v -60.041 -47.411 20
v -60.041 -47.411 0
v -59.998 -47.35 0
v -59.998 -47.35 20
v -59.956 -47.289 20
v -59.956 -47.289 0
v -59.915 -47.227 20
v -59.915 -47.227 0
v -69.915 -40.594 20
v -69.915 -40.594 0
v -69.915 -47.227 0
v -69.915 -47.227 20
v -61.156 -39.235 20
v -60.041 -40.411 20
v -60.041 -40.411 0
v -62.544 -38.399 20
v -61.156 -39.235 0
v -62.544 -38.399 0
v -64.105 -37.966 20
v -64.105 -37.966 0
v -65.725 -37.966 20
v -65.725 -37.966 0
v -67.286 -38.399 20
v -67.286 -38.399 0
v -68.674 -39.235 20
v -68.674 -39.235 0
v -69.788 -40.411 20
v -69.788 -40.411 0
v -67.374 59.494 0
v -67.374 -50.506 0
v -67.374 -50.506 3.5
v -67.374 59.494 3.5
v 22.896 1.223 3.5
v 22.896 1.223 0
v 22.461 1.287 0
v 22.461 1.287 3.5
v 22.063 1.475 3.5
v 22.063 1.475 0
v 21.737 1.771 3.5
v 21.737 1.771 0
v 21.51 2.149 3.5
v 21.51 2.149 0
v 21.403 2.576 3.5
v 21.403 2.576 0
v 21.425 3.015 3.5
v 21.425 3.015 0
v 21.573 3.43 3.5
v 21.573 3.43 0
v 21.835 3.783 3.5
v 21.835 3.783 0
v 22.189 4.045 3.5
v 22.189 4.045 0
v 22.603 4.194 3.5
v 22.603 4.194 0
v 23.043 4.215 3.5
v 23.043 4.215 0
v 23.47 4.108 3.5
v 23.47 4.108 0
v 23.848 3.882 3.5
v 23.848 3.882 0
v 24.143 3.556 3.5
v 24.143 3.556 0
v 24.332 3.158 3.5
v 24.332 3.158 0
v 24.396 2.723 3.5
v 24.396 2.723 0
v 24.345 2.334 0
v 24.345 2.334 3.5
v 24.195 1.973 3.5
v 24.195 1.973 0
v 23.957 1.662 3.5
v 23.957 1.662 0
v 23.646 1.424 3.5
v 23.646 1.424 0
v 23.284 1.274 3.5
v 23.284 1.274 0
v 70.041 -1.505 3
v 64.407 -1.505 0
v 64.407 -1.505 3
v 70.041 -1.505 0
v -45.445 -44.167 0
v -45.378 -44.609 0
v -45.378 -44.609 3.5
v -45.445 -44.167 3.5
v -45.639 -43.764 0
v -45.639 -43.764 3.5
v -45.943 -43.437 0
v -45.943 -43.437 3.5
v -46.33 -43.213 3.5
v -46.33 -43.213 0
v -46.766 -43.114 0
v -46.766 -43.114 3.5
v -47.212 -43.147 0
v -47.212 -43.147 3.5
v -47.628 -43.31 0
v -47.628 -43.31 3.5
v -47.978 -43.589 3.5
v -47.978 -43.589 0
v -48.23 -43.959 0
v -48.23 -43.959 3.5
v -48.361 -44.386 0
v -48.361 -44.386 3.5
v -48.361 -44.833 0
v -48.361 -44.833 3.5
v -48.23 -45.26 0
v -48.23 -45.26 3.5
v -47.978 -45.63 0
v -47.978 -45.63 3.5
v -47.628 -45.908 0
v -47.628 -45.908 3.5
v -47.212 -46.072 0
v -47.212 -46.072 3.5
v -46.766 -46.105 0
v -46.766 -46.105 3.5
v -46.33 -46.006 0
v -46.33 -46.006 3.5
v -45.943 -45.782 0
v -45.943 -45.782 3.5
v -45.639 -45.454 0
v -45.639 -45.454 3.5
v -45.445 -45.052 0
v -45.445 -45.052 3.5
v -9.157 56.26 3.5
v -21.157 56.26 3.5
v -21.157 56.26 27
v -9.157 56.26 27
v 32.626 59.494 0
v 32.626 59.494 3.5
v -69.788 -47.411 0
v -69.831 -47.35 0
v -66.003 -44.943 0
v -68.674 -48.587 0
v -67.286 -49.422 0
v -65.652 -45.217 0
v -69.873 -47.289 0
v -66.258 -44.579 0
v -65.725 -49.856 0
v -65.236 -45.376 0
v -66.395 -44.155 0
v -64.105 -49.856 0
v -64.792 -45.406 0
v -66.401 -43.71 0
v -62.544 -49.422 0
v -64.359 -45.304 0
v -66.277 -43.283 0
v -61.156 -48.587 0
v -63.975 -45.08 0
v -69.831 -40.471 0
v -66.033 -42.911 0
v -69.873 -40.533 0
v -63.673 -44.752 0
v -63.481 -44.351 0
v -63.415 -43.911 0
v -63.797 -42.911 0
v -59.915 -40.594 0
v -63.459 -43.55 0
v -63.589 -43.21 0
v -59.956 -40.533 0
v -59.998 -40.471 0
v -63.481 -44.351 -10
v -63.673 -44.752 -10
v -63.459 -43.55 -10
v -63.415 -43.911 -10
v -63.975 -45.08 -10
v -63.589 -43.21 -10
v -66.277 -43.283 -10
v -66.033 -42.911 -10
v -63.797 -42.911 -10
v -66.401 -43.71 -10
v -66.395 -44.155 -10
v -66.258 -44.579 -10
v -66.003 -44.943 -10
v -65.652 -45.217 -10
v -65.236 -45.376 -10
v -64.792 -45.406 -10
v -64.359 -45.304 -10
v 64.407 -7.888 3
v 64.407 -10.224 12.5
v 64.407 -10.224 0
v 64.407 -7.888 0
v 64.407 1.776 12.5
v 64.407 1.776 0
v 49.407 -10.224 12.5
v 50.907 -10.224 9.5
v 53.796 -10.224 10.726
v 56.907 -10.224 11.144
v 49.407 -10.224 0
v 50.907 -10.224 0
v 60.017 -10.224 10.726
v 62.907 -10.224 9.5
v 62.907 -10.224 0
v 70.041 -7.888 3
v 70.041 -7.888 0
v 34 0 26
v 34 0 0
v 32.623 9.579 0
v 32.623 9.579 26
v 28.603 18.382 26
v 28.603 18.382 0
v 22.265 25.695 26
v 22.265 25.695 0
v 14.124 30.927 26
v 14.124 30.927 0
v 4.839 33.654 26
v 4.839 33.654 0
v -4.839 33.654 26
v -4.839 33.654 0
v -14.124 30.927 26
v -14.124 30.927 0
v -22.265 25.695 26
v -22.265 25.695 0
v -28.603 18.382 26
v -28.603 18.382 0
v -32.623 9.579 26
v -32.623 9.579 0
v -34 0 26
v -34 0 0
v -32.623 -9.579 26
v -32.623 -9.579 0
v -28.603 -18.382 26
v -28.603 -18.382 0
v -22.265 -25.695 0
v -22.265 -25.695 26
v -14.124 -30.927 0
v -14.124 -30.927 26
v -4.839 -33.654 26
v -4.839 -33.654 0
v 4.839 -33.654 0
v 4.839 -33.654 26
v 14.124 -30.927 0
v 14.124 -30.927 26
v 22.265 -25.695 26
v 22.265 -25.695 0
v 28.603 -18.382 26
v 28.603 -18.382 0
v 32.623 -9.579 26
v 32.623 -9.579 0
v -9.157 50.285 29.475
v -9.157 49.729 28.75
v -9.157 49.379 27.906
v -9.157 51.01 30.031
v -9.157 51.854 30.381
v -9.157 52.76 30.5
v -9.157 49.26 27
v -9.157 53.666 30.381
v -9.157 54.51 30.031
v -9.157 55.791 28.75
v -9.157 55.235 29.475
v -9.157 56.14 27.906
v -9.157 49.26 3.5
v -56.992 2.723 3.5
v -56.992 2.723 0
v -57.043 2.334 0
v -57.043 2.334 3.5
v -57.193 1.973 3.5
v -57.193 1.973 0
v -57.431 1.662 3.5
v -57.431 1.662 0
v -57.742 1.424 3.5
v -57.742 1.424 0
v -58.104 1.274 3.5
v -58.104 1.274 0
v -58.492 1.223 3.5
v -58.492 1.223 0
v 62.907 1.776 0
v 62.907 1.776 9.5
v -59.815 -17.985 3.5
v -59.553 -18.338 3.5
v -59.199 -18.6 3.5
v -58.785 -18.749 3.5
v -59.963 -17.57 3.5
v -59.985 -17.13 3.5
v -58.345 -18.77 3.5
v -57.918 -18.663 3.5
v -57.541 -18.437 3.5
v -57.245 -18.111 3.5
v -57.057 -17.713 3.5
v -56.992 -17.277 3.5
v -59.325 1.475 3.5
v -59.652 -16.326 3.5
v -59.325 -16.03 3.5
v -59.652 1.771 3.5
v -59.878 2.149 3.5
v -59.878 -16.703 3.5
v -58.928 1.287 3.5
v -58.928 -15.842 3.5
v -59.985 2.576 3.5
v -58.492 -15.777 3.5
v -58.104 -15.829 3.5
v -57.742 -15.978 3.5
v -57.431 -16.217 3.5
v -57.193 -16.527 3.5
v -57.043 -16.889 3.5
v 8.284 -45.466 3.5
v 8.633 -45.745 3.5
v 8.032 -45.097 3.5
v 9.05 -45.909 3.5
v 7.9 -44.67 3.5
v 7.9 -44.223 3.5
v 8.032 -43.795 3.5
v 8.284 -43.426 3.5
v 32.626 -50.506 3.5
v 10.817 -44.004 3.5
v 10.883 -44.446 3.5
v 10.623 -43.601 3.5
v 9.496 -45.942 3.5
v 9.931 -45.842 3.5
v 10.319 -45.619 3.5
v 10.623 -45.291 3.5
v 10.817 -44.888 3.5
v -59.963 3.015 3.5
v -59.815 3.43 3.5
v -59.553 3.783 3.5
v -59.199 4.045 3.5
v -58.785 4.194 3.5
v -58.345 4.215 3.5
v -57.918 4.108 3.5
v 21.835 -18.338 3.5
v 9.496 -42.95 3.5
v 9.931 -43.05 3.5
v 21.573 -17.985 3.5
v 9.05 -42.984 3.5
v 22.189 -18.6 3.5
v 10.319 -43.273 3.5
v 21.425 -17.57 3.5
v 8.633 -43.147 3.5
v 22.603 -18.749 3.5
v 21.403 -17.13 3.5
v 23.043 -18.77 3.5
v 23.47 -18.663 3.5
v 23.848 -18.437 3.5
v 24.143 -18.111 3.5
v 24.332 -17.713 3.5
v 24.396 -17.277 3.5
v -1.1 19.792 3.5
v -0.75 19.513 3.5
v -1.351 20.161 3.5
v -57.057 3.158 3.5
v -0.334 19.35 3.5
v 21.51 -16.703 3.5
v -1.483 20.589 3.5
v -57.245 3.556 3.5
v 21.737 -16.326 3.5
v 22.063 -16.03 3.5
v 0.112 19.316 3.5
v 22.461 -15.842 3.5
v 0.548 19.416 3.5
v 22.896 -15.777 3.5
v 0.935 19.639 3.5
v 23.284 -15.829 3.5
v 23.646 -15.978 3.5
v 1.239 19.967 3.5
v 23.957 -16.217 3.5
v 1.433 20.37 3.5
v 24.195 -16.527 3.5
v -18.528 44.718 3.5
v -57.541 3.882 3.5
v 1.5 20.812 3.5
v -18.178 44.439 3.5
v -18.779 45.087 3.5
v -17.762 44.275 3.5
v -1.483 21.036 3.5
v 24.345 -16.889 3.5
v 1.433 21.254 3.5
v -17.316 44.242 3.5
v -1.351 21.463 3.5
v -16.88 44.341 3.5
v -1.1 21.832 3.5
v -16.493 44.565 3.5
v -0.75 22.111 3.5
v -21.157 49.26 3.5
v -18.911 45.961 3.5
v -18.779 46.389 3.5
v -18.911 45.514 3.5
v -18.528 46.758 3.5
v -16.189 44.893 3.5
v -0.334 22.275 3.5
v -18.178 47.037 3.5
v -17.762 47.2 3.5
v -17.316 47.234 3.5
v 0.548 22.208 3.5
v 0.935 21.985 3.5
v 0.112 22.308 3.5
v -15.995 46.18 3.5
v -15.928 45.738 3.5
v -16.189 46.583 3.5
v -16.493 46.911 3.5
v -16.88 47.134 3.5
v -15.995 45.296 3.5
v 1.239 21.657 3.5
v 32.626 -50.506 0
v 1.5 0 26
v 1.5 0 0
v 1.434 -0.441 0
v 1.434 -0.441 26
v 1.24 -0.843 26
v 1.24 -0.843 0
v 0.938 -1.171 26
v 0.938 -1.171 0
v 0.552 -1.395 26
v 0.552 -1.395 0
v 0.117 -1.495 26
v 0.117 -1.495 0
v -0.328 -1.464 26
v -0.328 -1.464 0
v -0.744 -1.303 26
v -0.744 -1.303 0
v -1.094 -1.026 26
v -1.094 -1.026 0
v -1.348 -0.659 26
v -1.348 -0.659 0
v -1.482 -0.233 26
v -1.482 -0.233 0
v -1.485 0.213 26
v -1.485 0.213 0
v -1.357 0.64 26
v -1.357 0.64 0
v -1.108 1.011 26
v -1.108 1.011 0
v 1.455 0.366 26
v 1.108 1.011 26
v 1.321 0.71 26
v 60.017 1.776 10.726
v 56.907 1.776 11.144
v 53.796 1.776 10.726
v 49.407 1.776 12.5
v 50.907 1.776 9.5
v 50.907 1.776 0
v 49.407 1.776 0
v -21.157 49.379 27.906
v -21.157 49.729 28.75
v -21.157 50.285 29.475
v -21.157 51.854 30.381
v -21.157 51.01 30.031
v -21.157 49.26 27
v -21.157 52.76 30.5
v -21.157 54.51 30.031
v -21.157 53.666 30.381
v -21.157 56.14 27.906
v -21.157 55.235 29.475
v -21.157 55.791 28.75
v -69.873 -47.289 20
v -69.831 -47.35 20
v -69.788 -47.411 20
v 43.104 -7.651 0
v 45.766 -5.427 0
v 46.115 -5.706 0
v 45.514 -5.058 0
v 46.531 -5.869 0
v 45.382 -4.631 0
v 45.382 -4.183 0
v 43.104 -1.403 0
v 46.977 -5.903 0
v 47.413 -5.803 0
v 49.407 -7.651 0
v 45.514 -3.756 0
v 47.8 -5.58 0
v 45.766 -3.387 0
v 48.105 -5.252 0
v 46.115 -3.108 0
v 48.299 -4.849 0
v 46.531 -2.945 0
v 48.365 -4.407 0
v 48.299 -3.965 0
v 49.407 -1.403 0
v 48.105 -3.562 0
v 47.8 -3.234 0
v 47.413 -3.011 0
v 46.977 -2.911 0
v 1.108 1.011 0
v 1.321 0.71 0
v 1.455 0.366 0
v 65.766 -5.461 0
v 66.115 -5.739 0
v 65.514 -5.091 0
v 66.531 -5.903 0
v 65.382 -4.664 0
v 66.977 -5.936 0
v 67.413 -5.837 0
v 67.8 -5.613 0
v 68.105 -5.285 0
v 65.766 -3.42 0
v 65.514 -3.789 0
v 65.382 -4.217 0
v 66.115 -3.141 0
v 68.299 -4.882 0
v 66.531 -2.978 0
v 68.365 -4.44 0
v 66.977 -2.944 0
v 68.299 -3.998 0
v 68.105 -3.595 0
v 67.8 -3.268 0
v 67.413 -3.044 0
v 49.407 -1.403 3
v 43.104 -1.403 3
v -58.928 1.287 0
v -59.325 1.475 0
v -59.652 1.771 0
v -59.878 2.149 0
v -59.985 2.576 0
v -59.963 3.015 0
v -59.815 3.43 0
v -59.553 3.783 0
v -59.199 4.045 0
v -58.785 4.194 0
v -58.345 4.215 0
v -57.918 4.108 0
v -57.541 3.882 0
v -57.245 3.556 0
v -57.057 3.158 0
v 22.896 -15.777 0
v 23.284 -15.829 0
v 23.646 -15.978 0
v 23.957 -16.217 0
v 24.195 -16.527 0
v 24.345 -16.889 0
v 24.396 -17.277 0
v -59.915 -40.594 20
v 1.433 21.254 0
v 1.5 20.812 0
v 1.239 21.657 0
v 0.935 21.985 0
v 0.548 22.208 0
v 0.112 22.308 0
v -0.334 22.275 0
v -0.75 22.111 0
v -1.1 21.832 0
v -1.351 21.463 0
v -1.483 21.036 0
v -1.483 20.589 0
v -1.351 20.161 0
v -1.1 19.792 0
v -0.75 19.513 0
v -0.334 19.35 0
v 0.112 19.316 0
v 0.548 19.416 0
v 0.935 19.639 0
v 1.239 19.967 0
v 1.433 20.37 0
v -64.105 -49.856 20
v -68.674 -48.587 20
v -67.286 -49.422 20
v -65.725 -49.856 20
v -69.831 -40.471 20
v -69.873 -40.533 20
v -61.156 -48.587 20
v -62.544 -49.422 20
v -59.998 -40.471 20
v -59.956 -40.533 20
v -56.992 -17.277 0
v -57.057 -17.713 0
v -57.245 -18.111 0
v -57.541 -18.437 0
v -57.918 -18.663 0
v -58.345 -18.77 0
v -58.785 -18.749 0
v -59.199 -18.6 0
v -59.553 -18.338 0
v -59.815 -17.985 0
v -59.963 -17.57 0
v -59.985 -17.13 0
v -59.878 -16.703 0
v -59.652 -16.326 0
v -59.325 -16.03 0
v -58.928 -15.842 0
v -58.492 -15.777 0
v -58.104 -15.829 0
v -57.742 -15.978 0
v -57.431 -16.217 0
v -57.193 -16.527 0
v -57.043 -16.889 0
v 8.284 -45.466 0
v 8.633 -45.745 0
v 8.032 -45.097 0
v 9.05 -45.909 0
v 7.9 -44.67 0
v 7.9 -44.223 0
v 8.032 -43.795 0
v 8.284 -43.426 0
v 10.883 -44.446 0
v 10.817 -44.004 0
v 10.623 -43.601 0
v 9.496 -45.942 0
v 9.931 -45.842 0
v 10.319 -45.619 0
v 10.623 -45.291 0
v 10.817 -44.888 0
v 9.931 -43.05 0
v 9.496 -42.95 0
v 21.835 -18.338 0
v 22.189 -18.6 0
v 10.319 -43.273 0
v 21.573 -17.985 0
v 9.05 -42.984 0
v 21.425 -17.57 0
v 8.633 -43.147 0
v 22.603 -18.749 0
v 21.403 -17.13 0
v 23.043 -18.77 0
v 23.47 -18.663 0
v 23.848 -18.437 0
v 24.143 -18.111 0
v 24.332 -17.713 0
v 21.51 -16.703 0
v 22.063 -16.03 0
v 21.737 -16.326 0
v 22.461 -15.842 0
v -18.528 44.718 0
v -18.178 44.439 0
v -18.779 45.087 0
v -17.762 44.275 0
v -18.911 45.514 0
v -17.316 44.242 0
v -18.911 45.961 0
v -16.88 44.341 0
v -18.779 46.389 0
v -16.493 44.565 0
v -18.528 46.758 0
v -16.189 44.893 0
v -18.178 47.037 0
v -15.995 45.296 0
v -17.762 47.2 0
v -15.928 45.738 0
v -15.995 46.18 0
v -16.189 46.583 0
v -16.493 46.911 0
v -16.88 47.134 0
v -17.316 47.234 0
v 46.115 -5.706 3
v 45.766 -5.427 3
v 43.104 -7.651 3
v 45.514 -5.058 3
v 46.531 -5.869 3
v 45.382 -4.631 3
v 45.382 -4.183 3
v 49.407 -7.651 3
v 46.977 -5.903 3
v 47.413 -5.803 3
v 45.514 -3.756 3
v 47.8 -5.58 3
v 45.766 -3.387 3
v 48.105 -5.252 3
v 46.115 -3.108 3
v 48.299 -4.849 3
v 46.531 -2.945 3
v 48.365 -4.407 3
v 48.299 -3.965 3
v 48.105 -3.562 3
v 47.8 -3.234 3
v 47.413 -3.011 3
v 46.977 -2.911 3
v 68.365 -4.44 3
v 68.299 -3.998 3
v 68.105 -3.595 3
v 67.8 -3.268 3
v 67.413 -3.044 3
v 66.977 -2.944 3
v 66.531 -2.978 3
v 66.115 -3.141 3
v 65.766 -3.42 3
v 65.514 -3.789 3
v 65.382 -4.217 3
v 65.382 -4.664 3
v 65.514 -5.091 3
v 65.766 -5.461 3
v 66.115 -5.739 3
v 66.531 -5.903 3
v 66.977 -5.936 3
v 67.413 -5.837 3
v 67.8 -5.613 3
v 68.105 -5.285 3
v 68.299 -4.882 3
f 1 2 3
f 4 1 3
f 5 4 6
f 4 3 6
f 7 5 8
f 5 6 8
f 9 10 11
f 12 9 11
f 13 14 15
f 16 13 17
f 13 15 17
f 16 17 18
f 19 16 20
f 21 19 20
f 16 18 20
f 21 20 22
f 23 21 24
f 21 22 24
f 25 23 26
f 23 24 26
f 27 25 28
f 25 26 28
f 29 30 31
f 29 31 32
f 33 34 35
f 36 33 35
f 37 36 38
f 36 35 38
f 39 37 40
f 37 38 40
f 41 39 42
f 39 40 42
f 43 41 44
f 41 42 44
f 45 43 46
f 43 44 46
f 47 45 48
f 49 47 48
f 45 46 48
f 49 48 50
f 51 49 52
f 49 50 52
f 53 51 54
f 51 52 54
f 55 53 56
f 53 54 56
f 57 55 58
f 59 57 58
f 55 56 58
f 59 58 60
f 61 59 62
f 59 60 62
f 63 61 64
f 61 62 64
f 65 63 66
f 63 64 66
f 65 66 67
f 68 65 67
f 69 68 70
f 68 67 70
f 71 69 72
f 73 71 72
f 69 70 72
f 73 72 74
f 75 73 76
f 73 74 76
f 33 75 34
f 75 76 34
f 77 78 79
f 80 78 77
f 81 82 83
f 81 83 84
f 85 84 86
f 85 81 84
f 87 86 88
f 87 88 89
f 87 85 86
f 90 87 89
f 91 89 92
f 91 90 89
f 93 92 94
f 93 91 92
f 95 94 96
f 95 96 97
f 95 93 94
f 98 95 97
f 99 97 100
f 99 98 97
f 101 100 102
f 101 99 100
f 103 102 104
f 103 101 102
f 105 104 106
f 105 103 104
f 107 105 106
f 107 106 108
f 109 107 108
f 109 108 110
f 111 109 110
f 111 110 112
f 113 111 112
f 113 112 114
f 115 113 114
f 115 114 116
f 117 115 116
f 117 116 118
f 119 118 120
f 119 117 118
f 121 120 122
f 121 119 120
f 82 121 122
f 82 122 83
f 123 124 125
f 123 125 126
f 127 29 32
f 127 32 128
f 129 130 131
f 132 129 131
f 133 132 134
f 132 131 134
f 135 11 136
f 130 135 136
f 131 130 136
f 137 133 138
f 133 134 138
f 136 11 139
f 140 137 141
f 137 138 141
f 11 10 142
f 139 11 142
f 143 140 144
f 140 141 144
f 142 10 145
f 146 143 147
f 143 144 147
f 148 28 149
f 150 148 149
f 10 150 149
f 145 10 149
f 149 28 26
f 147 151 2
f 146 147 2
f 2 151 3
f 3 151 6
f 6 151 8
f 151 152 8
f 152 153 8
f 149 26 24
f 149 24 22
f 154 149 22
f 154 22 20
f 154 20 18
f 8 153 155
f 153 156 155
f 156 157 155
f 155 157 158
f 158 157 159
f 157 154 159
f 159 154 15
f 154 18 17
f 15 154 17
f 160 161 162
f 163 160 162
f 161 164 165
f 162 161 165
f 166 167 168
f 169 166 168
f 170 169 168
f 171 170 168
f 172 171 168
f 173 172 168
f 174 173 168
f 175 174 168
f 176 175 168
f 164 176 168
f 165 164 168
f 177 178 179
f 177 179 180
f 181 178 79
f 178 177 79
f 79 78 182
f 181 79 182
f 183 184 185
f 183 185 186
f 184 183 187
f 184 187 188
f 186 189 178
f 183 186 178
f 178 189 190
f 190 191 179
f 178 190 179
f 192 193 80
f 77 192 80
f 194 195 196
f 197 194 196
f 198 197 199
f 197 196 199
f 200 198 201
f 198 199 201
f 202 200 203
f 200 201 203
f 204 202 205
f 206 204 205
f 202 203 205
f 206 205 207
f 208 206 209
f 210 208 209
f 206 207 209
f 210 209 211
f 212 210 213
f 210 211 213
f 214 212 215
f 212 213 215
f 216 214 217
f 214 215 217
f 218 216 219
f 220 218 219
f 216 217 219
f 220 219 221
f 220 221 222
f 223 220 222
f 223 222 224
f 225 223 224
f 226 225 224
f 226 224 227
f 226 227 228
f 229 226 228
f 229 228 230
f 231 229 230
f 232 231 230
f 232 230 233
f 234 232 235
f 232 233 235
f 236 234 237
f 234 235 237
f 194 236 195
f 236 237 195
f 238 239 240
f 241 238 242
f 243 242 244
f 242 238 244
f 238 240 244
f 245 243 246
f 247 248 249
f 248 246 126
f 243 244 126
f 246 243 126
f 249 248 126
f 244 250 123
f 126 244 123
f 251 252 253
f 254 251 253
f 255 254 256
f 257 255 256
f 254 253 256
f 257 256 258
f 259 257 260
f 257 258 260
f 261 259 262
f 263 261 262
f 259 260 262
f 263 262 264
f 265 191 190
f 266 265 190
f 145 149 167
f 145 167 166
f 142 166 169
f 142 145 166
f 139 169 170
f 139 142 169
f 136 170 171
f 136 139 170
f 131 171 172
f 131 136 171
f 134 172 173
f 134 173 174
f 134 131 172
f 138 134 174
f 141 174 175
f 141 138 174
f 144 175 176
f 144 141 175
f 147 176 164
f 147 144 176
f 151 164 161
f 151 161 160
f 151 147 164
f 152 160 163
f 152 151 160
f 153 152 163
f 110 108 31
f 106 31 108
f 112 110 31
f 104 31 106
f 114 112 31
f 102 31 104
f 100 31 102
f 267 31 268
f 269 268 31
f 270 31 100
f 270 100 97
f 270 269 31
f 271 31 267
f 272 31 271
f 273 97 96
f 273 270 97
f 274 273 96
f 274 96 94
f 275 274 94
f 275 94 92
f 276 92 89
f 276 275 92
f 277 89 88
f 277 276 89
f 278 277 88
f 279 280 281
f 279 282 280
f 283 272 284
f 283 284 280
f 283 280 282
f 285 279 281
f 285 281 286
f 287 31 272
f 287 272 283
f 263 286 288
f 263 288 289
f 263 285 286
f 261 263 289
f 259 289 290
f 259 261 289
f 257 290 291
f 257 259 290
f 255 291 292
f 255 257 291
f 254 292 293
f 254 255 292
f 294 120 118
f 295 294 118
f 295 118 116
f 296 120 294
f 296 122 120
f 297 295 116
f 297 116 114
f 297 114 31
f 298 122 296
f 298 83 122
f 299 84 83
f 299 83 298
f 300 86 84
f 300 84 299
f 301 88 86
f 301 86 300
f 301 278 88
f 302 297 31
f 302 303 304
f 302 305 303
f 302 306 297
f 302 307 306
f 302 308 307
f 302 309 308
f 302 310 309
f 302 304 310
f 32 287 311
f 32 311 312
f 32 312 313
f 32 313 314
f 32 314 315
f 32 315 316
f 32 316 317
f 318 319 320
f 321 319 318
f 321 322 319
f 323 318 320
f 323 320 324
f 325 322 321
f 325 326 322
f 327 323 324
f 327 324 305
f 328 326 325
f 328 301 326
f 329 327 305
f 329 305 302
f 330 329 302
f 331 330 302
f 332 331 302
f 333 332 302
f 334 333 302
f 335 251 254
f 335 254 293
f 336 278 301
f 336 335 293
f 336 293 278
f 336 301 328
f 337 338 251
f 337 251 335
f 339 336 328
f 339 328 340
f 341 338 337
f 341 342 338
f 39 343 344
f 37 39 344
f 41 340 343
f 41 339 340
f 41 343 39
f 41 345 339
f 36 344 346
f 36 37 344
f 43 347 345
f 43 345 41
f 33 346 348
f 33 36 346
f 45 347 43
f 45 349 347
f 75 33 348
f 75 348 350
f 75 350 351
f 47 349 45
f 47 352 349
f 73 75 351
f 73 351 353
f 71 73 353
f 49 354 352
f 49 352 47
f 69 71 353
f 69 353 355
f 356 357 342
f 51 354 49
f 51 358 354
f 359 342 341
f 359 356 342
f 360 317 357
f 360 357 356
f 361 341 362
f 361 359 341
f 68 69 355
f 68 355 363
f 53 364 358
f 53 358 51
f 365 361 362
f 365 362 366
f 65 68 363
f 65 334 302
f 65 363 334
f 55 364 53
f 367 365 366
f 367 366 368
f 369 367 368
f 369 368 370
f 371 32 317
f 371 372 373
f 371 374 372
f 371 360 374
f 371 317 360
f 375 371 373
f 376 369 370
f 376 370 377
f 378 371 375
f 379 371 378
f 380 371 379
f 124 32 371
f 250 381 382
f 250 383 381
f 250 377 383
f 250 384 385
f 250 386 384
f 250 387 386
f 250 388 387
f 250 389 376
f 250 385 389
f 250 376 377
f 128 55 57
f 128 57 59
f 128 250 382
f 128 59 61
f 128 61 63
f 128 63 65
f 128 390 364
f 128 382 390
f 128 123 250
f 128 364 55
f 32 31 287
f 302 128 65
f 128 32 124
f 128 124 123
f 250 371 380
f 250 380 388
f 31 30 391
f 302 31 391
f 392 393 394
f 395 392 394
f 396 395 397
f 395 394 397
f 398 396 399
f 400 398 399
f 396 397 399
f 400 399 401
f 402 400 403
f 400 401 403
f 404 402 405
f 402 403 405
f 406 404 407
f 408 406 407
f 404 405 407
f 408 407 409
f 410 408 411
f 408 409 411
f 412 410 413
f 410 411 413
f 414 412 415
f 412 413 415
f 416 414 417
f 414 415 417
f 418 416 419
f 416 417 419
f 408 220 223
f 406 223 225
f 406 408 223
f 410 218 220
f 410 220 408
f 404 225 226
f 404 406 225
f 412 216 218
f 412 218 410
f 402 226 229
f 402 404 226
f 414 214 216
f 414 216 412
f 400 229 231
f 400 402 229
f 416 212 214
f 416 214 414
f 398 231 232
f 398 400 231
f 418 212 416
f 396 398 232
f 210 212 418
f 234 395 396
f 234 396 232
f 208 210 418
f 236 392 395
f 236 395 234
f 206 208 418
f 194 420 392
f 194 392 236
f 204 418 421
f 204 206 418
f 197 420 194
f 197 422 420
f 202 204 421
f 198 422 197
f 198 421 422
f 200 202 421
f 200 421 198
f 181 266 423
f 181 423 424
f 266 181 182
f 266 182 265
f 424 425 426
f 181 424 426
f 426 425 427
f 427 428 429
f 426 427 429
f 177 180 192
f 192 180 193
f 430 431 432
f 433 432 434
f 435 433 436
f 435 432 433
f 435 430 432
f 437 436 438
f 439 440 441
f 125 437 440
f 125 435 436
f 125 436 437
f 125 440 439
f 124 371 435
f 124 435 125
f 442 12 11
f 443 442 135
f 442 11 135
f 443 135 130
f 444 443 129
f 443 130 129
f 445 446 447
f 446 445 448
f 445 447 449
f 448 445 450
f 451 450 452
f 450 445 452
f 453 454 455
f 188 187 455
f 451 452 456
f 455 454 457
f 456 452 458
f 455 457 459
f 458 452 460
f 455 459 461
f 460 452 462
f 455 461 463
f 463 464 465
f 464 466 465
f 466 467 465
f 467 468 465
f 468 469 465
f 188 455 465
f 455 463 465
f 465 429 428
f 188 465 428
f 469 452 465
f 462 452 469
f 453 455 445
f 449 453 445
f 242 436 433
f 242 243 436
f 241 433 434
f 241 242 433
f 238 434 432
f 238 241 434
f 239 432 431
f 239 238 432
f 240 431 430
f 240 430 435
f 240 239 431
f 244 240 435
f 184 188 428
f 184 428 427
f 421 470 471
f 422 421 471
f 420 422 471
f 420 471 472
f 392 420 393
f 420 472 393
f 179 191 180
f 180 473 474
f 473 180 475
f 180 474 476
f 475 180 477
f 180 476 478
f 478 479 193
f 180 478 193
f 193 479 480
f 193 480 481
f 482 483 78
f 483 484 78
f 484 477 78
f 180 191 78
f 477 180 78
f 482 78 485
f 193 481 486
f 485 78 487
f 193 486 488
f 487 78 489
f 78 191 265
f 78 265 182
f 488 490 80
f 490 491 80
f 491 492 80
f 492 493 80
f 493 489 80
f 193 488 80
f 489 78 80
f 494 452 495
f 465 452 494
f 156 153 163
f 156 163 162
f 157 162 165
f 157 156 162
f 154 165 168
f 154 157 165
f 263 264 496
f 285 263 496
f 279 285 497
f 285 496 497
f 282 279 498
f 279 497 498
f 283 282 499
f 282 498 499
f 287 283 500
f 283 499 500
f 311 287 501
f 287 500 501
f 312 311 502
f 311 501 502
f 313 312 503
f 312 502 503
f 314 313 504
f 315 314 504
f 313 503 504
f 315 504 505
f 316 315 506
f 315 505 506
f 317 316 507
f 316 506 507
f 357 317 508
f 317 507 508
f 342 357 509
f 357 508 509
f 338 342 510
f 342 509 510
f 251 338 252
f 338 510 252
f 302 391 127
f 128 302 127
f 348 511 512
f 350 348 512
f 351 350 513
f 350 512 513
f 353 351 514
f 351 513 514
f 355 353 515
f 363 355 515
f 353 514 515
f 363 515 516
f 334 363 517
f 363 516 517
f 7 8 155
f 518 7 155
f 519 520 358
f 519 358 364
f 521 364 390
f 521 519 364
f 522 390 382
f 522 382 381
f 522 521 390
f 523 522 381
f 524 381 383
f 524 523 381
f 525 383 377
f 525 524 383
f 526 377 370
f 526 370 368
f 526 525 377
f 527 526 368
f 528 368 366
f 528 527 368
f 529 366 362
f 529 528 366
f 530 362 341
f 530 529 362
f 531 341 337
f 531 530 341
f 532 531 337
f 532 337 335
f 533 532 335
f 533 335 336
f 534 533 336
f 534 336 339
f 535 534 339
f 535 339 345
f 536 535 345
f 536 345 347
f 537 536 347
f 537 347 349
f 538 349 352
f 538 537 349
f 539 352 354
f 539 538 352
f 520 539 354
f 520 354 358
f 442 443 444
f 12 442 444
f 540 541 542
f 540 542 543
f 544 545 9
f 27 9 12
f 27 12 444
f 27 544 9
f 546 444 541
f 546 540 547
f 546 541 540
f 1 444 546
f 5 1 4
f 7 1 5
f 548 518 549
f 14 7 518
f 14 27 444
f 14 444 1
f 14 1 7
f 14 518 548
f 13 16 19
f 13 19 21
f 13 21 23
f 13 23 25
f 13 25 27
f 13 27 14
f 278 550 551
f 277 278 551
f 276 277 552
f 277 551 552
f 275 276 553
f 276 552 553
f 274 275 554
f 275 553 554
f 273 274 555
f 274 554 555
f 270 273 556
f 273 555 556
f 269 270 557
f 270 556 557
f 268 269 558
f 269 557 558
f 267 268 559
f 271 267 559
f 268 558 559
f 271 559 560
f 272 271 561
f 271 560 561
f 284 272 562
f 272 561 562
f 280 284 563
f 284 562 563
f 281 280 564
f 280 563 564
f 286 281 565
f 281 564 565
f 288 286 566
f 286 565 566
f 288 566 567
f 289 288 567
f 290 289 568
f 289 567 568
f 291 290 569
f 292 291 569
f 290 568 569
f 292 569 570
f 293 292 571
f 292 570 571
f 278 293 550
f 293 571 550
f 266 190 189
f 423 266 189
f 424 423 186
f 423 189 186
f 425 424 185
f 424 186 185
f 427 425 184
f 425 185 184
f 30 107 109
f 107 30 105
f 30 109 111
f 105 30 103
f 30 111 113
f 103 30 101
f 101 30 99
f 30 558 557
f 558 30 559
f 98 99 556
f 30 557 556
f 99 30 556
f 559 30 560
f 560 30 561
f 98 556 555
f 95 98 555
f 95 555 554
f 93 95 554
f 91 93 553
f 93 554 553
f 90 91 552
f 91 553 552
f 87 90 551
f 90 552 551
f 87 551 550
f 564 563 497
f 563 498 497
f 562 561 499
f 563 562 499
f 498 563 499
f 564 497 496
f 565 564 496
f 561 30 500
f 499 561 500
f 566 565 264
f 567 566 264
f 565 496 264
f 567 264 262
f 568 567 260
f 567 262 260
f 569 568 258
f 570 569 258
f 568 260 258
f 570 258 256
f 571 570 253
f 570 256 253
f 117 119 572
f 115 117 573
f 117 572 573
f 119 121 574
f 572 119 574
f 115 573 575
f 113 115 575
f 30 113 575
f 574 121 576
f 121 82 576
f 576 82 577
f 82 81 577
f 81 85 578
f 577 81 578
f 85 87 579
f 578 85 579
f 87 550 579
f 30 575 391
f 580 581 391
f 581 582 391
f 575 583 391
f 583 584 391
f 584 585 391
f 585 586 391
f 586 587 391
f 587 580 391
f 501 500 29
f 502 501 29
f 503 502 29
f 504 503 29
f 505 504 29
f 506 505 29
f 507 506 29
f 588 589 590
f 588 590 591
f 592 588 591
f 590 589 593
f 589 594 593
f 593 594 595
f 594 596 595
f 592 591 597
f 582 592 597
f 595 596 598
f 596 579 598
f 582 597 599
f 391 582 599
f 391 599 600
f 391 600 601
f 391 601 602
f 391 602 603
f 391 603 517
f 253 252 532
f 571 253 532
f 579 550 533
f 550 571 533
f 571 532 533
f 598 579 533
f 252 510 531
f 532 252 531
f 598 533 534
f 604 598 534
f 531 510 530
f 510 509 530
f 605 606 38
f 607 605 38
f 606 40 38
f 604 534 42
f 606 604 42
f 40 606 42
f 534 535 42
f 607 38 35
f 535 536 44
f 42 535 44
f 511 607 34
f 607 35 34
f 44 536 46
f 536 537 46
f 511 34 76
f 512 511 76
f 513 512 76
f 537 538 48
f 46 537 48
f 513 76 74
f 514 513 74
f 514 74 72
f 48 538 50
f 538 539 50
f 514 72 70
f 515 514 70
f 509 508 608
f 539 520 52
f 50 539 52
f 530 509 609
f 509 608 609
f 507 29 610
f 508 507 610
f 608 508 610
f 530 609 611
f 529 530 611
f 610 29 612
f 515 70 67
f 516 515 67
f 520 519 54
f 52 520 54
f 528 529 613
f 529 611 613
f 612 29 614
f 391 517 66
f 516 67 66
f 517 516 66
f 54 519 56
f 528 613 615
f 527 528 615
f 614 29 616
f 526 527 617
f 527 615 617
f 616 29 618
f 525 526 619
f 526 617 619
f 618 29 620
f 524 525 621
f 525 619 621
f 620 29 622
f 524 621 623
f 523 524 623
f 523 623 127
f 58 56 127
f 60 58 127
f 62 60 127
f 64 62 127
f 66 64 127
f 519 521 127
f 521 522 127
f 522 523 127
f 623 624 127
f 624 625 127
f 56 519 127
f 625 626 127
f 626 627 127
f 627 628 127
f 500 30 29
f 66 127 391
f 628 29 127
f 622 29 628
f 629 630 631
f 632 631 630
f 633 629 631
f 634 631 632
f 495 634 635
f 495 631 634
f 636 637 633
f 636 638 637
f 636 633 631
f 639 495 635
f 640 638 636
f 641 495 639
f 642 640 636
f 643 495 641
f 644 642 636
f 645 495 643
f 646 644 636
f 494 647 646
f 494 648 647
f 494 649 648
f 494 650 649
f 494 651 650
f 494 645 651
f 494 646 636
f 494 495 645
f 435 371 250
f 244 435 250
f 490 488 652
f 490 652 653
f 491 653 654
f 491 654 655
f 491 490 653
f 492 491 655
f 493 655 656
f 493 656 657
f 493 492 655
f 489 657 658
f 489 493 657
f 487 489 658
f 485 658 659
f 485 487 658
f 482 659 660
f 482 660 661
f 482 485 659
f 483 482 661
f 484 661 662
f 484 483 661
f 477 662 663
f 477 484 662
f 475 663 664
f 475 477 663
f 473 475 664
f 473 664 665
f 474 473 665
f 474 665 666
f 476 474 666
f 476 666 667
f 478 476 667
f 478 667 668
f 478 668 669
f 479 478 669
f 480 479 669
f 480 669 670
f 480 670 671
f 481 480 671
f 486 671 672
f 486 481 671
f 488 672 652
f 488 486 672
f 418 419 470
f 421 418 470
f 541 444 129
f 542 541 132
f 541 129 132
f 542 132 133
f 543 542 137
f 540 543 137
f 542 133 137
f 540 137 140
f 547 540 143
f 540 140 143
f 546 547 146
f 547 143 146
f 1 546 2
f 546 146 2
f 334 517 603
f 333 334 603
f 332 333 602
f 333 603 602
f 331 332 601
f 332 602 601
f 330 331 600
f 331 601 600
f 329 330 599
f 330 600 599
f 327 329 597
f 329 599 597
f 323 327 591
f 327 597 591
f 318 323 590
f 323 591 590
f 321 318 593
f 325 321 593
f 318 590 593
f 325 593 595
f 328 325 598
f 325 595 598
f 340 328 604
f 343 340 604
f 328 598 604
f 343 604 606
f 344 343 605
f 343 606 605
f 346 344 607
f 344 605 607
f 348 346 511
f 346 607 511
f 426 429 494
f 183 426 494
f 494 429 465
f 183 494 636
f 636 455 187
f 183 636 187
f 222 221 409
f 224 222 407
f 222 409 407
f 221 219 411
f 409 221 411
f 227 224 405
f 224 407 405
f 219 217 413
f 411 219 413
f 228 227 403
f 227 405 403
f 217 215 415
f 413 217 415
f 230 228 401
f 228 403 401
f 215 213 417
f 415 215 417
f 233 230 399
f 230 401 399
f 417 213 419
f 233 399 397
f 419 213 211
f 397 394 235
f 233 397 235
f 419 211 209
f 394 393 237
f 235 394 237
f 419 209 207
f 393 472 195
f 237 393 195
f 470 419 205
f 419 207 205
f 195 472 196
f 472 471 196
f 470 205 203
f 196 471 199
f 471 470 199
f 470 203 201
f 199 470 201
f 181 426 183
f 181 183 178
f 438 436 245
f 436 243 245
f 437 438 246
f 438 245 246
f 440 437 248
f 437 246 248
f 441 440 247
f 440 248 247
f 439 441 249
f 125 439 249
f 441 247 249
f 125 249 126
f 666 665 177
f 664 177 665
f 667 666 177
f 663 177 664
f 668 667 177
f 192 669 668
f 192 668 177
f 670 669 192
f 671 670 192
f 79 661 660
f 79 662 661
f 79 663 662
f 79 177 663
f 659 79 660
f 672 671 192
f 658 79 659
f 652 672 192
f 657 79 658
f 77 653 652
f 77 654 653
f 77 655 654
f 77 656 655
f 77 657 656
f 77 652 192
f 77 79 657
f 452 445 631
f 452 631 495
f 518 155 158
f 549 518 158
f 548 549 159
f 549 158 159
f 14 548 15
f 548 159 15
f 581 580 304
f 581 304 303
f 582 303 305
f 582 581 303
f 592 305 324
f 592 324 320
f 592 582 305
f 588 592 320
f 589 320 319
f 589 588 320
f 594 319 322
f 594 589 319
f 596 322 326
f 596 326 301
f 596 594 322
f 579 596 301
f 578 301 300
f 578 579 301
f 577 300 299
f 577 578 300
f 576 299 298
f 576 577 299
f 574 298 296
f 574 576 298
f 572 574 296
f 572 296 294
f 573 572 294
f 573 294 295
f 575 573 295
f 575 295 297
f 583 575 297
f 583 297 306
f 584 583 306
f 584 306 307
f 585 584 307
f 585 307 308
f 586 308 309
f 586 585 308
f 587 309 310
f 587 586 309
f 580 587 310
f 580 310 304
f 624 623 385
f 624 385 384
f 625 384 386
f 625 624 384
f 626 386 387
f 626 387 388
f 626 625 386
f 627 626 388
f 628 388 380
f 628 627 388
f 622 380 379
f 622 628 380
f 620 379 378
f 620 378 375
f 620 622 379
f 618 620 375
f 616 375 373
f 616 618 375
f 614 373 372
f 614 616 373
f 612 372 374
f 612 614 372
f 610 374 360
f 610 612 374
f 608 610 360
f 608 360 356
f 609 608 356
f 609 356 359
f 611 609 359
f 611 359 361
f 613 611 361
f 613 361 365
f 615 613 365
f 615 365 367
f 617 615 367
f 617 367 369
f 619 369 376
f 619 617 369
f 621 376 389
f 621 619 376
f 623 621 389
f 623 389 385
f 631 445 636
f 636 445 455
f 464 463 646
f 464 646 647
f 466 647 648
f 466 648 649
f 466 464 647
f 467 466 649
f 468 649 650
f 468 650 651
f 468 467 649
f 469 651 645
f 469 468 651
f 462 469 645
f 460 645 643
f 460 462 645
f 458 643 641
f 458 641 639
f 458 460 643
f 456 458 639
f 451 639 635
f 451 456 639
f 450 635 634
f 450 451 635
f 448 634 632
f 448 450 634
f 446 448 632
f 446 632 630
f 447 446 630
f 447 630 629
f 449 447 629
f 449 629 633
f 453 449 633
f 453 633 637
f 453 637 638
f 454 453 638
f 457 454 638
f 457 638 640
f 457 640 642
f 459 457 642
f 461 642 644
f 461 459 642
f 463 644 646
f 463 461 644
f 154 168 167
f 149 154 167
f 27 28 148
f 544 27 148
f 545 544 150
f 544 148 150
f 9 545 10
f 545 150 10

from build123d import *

# Parameters (mm, degrees)
F0_R      = 34
F1_DEPTH  = 26
F2_DEPTH  = 26
F4_DEPTH  = 20
F5_DEPTH  = 20
F6_DEPTH  = 20
F7_DEPTH  = 10
F8_W      = 100
F8_H      = 110
F8_R      = 1.5
F8_W_2    = 12
F8_H_2    = 7
F9_DEPTH  = 3.5
F10_DEPTH = 30.5
F11_R     = 3.5
F12_R     = 3.49999
F14_DEPTH = 12.5
F13_W     = 6.3024445623
F13_H     = 6.2478113687
F13_R     = 1.5
F15_DEPTH = 3
F13_W_2   = 5.6342094392
F13_H_2   = 6.382860709
F16_DEPTH = 3
F17_W     = 12
F17_H     = 10
F18_DEPTH = 25


# Not quite as in the source:
# - a fillet or chamfer is up to 0.001 mm smaller than in the source, because OpenCascade refuses the exact size


with BuildPart() as f1:
    # F0 (on Top) → F1 (new body)
    with BuildSketch(Plane.XY):
        Circle(F0_R)
        with BuildLine():
            ThreePointArc((1.1084163734, 1.0106498618), (1.3986823371, 0.5419296264), (1.5, 0))
            ThreePointArc((1.5, 0), (-0.5419296264, -1.3986823371), (-1.1084163734, 1.0106498618))
            ThreePointArc((-1.1084163734, 1.0106498618), (0, 1.5), (1.1084163734, 1.0106498618))
        make_face(mode=Mode.SUBTRACT)
    extrude(amount=F1_DEPTH)

    # F0 (on Top) → F2 (join)
    with BuildSketch(Plane.XY):
        with BuildLine():
            Line((-1.1084163734, 1.0106498618), (1.1084163734, 1.0106498618))
            ThreePointArc((1.1084163734, 1.0106498618), (0, 1.5), (-1.1084163734, 1.0106498618))
        make_face()
    extrude(amount=F2_DEPTH)


with BuildPart() as f4:
    # F3 (on Top) → F4 (new body)
    with BuildSketch(Plane.XY):
        with BuildLine():
            Line((-69.9148401618, -40.5942231864), (-69.9148401618, -47.2274727672))
            ThreePointArc((-69.9148401618, -47.2274727672), (-69.8523901158, -47.319748159), (-69.7882373342, -47.4108479768))
            Line((-69.7882373342, -47.4108479768), (-60.0414429894, -47.4108479768))
            ThreePointArc((-60.0414429894, -47.4108479768), (-59.9772902078, -47.319748159), (-59.9148401618, -47.2274727672))
            Line((-59.9148401618, -47.2274727672), (-59.9148401618, -40.5942231864))
            ThreePointArc((-59.9148401618, -40.5942231864), (-59.9772902078, -40.5019477946), (-60.0414429894, -40.4108479768))
            Line((-60.0414429894, -40.4108479768), (-69.7882373342, -40.4108479768))
            ThreePointArc((-69.7882373342, -40.4108479768), (-69.8523901158, -40.5019477946), (-69.9148401618, -40.5942231864))
        make_face()
        with BuildLine():
            ThreePointArc((-63.7968061731, -42.9108479768), (-63.5135816234, -43.3756148421), (-63.4148401618, -43.9108479768))
            ThreePointArc((-63.4148401618, -43.9108479768), (-65.4500732965, -45.3121065152), (-66.0328741506, -42.9108479768))
            ThreePointArc((-66.0328741506, -42.9108479768), (-64.9148401618, -42.4108479768), (-63.7968061731, -42.9108479768))
        make_face(mode=Mode.SUBTRACT)
    extrude(amount=F4_DEPTH)

    # F3 (on Top) → F5 (join)
    with BuildSketch(Plane.XY):
        with BuildLine():
            Line((-60.0414429894, -47.4108479768), (-69.7882373342, -47.4108479768))
            ThreePointArc((-69.7882373342, -47.4108479768), (-64.9148401618, -49.9108479768), (-60.0414429894, -47.4108479768))
        make_face()
        with BuildLine():
            Line((-66.0328741506, -42.9108479768), (-63.7968061731, -42.9108479768))
            ThreePointArc((-63.7968061731, -42.9108479768), (-64.9148401618, -42.4108479768), (-66.0328741506, -42.9108479768))
        make_face()
        with BuildLine():
            ThreePointArc((-66.0328741506, -42.9108479768), (-65.4500732965, -45.3121065152), (-63.4148401618, -43.9108479768))
            ThreePointArc((-63.4148401618, -43.9108479768), (-63.5135816234, -43.3756148421), (-63.7968061731, -42.9108479768))
            Line((-63.7968061731, -42.9108479768), (-66.0328741506, -42.9108479768))
        make_face()
    extrude(amount=F5_DEPTH)

    # F3 (on Top) → F6 (join)
    with BuildSketch(Plane.XY):
        with BuildLine():
            ThreePointArc((-60.0414429894, -40.4108479768), (-64.9148401618, -37.9108479768), (-69.7882373342, -40.4108479768))
            Line((-69.7882373342, -40.4108479768), (-60.0414429894, -40.4108479768))
        make_face()
    extrude(amount=F6_DEPTH)

    # F3 (on Top) → F7 (join)
    with BuildSketch(Plane.XY):
        with BuildLine():
            ThreePointArc((-66.0328741506, -42.9108479768), (-65.4500732965, -45.3121065152), (-63.4148401618, -43.9108479768))
            ThreePointArc((-63.4148401618, -43.9108479768), (-63.5135816234, -43.3756148421), (-63.7968061731, -42.9108479768))
            Line((-63.7968061731, -42.9108479768), (-66.0328741506, -42.9108479768))
        make_face()
    extrude(amount=-F7_DEPTH)


with BuildPart() as f9:
    # F8 (on Top) → F9 (new body)
    with BuildSketch(Plane.XY):
        with Locations((-17.3735144734, 4.4944389339)):
            Rectangle(F8_W, F8_H)
        with Locations((-46.8782410026, -44.6094162762)):
            Circle(F8_R, mode=Mode.SUBTRACT)
        with BuildLine():
            ThreePointArc((-58.4921389818, -15.7774437815), (-57.43147881, -16.2167836097), (-56.9921389818, -17.2774437815))
            ThreePointArc((-56.9921389818, -17.2774437815), (-59.5527991536, -18.3381039533), (-58.4921389818, -15.7774437815))
        make_face(mode=Mode.SUBTRACT)
        with BuildLine():
            ThreePointArc((-56.9921389818, 2.7225562185), (-57.43147881, 1.6618960467), (-58.4921389818, 1.2225562185))
            ThreePointArc((-58.4921389818, 1.2225562185), (-59.5527991536, 3.7832163903), (-56.9921389818, 2.7225562185))
        make_face(mode=Mode.SUBTRACT)
        with Locations((9.3834688887, -44.4461479783)):
            Circle(F8_R, mode=Mode.SUBTRACT)
        with BuildLine():
            ThreePointArc((24.3961110115, -17.2774437815), (21.8354508397, -18.3381039533), (22.8961110115, -15.7774437815))
            ThreePointArc((22.8961110115, -15.7774437815), (23.9567711833, -16.2167836097), (24.3961110115, -17.2774437815))
        make_face(mode=Mode.SUBTRACT)
        with BuildLine():
            ThreePointArc((24.3961110115, 2.7225562185), (23.9567711833, 1.6618960467), (22.8961110115, 1.2225562185))
            ThreePointArc((22.8961110115, 1.2225562185), (21.8354508397, 3.7832163903), (24.3961110115, 2.7225562185))
        make_face(mode=Mode.SUBTRACT)
        with Locations((-17.4279436469, 45.7378067076)):
            Circle(F8_R, mode=Mode.SUBTRACT)
        with Locations((0, 20.8121649921)):
            Circle(F8_R, mode=Mode.SUBTRACT)
        with Locations((-15.1569909006, 52.7596849799)):
            Rectangle(F8_W_2, F8_H_2, mode=Mode.SUBTRACT)
    extrude(amount=F9_DEPTH)

    # F8 (on Top) → F10 (join)
    with BuildSketch(Plane.XY):
        with Locations((-15.1569909006, 52.7596849799)):
            Rectangle(F8_W_2, F8_H_2)
    extrude(amount=F10_DEPTH)

    # F11
    f11_edges = [f9.edges().sort_by_distance(p)[0] for p in [
        (-15.156991, 49.259685, 30.5),
    ]]
    fillet(f11_edges, radius=F11_R)

    # F12 (radius 3.5 in the source; OpenCascade refuses exactly that, so slightly less here)
    f12_edges = [f9.edges().sort_by_distance(p)[0] for p in [
        (-15.156991, 56.259685, 30.5),
    ]]
    fillet(f12_edges, radius=F12_R)


with BuildPart() as f14:
    # F13 (on Top) → F14 (new body)
    with BuildSketch(Plane.XY):
        Polygon((64.406843558, 1.7756032334), (49.406843558, 1.7756032334), (49.406843558, -1.4032047475), (49.406843558, -7.6510161161), (49.406843558, -10.2243967666), (64.406843558, -10.2243967666), (64.406843558, -7.8880153596), (64.406843558, -1.5051546507), align=None)
    extrude(amount=F14_DEPTH)

    # F13 (on Top) → F15 (join)
    with BuildSketch(Plane.XY):
        with Locations((46.2556212768, -4.5271104318)):
            Rectangle(F13_W, F13_H)
        with Locations((46.8652057648, -4.4069956057)):
            Circle(F13_R, mode=Mode.SUBTRACT)
    extrude(amount=F15_DEPTH)

    # F13 (on Top) → F16 (join)
    with BuildSketch(Plane.XY):
        with Locations((67.2239482775, -4.6965850051)):
            Rectangle(F13_W_2, F13_H_2)
        with Locations((66.8652057648, -4.4403001666)):
            Circle(F13_R, mode=Mode.SUBTRACT)
    extrude(amount=F16_DEPTH)

    # F17 (on face) → F18 (cut)
    with BuildSketch(Plane.XZ.offset(10.2243967666)):
        with BuildLine():
            ThreePointArc((62.906843558, 9.5), (56.906843558, 11.1443961122), (50.906843558, 9.5))
            Line((50.906843558, 9.5), (62.906843558, 9.5))
        make_face()
        with Locations((56.906843558, 4.5)):
            Rectangle(F17_W, F17_H)
    extrude(amount=-F18_DEPTH, mode=Mode.SUBTRACT)


solid = Compound([f1.part, f4.part, f9.part, f14.part])
